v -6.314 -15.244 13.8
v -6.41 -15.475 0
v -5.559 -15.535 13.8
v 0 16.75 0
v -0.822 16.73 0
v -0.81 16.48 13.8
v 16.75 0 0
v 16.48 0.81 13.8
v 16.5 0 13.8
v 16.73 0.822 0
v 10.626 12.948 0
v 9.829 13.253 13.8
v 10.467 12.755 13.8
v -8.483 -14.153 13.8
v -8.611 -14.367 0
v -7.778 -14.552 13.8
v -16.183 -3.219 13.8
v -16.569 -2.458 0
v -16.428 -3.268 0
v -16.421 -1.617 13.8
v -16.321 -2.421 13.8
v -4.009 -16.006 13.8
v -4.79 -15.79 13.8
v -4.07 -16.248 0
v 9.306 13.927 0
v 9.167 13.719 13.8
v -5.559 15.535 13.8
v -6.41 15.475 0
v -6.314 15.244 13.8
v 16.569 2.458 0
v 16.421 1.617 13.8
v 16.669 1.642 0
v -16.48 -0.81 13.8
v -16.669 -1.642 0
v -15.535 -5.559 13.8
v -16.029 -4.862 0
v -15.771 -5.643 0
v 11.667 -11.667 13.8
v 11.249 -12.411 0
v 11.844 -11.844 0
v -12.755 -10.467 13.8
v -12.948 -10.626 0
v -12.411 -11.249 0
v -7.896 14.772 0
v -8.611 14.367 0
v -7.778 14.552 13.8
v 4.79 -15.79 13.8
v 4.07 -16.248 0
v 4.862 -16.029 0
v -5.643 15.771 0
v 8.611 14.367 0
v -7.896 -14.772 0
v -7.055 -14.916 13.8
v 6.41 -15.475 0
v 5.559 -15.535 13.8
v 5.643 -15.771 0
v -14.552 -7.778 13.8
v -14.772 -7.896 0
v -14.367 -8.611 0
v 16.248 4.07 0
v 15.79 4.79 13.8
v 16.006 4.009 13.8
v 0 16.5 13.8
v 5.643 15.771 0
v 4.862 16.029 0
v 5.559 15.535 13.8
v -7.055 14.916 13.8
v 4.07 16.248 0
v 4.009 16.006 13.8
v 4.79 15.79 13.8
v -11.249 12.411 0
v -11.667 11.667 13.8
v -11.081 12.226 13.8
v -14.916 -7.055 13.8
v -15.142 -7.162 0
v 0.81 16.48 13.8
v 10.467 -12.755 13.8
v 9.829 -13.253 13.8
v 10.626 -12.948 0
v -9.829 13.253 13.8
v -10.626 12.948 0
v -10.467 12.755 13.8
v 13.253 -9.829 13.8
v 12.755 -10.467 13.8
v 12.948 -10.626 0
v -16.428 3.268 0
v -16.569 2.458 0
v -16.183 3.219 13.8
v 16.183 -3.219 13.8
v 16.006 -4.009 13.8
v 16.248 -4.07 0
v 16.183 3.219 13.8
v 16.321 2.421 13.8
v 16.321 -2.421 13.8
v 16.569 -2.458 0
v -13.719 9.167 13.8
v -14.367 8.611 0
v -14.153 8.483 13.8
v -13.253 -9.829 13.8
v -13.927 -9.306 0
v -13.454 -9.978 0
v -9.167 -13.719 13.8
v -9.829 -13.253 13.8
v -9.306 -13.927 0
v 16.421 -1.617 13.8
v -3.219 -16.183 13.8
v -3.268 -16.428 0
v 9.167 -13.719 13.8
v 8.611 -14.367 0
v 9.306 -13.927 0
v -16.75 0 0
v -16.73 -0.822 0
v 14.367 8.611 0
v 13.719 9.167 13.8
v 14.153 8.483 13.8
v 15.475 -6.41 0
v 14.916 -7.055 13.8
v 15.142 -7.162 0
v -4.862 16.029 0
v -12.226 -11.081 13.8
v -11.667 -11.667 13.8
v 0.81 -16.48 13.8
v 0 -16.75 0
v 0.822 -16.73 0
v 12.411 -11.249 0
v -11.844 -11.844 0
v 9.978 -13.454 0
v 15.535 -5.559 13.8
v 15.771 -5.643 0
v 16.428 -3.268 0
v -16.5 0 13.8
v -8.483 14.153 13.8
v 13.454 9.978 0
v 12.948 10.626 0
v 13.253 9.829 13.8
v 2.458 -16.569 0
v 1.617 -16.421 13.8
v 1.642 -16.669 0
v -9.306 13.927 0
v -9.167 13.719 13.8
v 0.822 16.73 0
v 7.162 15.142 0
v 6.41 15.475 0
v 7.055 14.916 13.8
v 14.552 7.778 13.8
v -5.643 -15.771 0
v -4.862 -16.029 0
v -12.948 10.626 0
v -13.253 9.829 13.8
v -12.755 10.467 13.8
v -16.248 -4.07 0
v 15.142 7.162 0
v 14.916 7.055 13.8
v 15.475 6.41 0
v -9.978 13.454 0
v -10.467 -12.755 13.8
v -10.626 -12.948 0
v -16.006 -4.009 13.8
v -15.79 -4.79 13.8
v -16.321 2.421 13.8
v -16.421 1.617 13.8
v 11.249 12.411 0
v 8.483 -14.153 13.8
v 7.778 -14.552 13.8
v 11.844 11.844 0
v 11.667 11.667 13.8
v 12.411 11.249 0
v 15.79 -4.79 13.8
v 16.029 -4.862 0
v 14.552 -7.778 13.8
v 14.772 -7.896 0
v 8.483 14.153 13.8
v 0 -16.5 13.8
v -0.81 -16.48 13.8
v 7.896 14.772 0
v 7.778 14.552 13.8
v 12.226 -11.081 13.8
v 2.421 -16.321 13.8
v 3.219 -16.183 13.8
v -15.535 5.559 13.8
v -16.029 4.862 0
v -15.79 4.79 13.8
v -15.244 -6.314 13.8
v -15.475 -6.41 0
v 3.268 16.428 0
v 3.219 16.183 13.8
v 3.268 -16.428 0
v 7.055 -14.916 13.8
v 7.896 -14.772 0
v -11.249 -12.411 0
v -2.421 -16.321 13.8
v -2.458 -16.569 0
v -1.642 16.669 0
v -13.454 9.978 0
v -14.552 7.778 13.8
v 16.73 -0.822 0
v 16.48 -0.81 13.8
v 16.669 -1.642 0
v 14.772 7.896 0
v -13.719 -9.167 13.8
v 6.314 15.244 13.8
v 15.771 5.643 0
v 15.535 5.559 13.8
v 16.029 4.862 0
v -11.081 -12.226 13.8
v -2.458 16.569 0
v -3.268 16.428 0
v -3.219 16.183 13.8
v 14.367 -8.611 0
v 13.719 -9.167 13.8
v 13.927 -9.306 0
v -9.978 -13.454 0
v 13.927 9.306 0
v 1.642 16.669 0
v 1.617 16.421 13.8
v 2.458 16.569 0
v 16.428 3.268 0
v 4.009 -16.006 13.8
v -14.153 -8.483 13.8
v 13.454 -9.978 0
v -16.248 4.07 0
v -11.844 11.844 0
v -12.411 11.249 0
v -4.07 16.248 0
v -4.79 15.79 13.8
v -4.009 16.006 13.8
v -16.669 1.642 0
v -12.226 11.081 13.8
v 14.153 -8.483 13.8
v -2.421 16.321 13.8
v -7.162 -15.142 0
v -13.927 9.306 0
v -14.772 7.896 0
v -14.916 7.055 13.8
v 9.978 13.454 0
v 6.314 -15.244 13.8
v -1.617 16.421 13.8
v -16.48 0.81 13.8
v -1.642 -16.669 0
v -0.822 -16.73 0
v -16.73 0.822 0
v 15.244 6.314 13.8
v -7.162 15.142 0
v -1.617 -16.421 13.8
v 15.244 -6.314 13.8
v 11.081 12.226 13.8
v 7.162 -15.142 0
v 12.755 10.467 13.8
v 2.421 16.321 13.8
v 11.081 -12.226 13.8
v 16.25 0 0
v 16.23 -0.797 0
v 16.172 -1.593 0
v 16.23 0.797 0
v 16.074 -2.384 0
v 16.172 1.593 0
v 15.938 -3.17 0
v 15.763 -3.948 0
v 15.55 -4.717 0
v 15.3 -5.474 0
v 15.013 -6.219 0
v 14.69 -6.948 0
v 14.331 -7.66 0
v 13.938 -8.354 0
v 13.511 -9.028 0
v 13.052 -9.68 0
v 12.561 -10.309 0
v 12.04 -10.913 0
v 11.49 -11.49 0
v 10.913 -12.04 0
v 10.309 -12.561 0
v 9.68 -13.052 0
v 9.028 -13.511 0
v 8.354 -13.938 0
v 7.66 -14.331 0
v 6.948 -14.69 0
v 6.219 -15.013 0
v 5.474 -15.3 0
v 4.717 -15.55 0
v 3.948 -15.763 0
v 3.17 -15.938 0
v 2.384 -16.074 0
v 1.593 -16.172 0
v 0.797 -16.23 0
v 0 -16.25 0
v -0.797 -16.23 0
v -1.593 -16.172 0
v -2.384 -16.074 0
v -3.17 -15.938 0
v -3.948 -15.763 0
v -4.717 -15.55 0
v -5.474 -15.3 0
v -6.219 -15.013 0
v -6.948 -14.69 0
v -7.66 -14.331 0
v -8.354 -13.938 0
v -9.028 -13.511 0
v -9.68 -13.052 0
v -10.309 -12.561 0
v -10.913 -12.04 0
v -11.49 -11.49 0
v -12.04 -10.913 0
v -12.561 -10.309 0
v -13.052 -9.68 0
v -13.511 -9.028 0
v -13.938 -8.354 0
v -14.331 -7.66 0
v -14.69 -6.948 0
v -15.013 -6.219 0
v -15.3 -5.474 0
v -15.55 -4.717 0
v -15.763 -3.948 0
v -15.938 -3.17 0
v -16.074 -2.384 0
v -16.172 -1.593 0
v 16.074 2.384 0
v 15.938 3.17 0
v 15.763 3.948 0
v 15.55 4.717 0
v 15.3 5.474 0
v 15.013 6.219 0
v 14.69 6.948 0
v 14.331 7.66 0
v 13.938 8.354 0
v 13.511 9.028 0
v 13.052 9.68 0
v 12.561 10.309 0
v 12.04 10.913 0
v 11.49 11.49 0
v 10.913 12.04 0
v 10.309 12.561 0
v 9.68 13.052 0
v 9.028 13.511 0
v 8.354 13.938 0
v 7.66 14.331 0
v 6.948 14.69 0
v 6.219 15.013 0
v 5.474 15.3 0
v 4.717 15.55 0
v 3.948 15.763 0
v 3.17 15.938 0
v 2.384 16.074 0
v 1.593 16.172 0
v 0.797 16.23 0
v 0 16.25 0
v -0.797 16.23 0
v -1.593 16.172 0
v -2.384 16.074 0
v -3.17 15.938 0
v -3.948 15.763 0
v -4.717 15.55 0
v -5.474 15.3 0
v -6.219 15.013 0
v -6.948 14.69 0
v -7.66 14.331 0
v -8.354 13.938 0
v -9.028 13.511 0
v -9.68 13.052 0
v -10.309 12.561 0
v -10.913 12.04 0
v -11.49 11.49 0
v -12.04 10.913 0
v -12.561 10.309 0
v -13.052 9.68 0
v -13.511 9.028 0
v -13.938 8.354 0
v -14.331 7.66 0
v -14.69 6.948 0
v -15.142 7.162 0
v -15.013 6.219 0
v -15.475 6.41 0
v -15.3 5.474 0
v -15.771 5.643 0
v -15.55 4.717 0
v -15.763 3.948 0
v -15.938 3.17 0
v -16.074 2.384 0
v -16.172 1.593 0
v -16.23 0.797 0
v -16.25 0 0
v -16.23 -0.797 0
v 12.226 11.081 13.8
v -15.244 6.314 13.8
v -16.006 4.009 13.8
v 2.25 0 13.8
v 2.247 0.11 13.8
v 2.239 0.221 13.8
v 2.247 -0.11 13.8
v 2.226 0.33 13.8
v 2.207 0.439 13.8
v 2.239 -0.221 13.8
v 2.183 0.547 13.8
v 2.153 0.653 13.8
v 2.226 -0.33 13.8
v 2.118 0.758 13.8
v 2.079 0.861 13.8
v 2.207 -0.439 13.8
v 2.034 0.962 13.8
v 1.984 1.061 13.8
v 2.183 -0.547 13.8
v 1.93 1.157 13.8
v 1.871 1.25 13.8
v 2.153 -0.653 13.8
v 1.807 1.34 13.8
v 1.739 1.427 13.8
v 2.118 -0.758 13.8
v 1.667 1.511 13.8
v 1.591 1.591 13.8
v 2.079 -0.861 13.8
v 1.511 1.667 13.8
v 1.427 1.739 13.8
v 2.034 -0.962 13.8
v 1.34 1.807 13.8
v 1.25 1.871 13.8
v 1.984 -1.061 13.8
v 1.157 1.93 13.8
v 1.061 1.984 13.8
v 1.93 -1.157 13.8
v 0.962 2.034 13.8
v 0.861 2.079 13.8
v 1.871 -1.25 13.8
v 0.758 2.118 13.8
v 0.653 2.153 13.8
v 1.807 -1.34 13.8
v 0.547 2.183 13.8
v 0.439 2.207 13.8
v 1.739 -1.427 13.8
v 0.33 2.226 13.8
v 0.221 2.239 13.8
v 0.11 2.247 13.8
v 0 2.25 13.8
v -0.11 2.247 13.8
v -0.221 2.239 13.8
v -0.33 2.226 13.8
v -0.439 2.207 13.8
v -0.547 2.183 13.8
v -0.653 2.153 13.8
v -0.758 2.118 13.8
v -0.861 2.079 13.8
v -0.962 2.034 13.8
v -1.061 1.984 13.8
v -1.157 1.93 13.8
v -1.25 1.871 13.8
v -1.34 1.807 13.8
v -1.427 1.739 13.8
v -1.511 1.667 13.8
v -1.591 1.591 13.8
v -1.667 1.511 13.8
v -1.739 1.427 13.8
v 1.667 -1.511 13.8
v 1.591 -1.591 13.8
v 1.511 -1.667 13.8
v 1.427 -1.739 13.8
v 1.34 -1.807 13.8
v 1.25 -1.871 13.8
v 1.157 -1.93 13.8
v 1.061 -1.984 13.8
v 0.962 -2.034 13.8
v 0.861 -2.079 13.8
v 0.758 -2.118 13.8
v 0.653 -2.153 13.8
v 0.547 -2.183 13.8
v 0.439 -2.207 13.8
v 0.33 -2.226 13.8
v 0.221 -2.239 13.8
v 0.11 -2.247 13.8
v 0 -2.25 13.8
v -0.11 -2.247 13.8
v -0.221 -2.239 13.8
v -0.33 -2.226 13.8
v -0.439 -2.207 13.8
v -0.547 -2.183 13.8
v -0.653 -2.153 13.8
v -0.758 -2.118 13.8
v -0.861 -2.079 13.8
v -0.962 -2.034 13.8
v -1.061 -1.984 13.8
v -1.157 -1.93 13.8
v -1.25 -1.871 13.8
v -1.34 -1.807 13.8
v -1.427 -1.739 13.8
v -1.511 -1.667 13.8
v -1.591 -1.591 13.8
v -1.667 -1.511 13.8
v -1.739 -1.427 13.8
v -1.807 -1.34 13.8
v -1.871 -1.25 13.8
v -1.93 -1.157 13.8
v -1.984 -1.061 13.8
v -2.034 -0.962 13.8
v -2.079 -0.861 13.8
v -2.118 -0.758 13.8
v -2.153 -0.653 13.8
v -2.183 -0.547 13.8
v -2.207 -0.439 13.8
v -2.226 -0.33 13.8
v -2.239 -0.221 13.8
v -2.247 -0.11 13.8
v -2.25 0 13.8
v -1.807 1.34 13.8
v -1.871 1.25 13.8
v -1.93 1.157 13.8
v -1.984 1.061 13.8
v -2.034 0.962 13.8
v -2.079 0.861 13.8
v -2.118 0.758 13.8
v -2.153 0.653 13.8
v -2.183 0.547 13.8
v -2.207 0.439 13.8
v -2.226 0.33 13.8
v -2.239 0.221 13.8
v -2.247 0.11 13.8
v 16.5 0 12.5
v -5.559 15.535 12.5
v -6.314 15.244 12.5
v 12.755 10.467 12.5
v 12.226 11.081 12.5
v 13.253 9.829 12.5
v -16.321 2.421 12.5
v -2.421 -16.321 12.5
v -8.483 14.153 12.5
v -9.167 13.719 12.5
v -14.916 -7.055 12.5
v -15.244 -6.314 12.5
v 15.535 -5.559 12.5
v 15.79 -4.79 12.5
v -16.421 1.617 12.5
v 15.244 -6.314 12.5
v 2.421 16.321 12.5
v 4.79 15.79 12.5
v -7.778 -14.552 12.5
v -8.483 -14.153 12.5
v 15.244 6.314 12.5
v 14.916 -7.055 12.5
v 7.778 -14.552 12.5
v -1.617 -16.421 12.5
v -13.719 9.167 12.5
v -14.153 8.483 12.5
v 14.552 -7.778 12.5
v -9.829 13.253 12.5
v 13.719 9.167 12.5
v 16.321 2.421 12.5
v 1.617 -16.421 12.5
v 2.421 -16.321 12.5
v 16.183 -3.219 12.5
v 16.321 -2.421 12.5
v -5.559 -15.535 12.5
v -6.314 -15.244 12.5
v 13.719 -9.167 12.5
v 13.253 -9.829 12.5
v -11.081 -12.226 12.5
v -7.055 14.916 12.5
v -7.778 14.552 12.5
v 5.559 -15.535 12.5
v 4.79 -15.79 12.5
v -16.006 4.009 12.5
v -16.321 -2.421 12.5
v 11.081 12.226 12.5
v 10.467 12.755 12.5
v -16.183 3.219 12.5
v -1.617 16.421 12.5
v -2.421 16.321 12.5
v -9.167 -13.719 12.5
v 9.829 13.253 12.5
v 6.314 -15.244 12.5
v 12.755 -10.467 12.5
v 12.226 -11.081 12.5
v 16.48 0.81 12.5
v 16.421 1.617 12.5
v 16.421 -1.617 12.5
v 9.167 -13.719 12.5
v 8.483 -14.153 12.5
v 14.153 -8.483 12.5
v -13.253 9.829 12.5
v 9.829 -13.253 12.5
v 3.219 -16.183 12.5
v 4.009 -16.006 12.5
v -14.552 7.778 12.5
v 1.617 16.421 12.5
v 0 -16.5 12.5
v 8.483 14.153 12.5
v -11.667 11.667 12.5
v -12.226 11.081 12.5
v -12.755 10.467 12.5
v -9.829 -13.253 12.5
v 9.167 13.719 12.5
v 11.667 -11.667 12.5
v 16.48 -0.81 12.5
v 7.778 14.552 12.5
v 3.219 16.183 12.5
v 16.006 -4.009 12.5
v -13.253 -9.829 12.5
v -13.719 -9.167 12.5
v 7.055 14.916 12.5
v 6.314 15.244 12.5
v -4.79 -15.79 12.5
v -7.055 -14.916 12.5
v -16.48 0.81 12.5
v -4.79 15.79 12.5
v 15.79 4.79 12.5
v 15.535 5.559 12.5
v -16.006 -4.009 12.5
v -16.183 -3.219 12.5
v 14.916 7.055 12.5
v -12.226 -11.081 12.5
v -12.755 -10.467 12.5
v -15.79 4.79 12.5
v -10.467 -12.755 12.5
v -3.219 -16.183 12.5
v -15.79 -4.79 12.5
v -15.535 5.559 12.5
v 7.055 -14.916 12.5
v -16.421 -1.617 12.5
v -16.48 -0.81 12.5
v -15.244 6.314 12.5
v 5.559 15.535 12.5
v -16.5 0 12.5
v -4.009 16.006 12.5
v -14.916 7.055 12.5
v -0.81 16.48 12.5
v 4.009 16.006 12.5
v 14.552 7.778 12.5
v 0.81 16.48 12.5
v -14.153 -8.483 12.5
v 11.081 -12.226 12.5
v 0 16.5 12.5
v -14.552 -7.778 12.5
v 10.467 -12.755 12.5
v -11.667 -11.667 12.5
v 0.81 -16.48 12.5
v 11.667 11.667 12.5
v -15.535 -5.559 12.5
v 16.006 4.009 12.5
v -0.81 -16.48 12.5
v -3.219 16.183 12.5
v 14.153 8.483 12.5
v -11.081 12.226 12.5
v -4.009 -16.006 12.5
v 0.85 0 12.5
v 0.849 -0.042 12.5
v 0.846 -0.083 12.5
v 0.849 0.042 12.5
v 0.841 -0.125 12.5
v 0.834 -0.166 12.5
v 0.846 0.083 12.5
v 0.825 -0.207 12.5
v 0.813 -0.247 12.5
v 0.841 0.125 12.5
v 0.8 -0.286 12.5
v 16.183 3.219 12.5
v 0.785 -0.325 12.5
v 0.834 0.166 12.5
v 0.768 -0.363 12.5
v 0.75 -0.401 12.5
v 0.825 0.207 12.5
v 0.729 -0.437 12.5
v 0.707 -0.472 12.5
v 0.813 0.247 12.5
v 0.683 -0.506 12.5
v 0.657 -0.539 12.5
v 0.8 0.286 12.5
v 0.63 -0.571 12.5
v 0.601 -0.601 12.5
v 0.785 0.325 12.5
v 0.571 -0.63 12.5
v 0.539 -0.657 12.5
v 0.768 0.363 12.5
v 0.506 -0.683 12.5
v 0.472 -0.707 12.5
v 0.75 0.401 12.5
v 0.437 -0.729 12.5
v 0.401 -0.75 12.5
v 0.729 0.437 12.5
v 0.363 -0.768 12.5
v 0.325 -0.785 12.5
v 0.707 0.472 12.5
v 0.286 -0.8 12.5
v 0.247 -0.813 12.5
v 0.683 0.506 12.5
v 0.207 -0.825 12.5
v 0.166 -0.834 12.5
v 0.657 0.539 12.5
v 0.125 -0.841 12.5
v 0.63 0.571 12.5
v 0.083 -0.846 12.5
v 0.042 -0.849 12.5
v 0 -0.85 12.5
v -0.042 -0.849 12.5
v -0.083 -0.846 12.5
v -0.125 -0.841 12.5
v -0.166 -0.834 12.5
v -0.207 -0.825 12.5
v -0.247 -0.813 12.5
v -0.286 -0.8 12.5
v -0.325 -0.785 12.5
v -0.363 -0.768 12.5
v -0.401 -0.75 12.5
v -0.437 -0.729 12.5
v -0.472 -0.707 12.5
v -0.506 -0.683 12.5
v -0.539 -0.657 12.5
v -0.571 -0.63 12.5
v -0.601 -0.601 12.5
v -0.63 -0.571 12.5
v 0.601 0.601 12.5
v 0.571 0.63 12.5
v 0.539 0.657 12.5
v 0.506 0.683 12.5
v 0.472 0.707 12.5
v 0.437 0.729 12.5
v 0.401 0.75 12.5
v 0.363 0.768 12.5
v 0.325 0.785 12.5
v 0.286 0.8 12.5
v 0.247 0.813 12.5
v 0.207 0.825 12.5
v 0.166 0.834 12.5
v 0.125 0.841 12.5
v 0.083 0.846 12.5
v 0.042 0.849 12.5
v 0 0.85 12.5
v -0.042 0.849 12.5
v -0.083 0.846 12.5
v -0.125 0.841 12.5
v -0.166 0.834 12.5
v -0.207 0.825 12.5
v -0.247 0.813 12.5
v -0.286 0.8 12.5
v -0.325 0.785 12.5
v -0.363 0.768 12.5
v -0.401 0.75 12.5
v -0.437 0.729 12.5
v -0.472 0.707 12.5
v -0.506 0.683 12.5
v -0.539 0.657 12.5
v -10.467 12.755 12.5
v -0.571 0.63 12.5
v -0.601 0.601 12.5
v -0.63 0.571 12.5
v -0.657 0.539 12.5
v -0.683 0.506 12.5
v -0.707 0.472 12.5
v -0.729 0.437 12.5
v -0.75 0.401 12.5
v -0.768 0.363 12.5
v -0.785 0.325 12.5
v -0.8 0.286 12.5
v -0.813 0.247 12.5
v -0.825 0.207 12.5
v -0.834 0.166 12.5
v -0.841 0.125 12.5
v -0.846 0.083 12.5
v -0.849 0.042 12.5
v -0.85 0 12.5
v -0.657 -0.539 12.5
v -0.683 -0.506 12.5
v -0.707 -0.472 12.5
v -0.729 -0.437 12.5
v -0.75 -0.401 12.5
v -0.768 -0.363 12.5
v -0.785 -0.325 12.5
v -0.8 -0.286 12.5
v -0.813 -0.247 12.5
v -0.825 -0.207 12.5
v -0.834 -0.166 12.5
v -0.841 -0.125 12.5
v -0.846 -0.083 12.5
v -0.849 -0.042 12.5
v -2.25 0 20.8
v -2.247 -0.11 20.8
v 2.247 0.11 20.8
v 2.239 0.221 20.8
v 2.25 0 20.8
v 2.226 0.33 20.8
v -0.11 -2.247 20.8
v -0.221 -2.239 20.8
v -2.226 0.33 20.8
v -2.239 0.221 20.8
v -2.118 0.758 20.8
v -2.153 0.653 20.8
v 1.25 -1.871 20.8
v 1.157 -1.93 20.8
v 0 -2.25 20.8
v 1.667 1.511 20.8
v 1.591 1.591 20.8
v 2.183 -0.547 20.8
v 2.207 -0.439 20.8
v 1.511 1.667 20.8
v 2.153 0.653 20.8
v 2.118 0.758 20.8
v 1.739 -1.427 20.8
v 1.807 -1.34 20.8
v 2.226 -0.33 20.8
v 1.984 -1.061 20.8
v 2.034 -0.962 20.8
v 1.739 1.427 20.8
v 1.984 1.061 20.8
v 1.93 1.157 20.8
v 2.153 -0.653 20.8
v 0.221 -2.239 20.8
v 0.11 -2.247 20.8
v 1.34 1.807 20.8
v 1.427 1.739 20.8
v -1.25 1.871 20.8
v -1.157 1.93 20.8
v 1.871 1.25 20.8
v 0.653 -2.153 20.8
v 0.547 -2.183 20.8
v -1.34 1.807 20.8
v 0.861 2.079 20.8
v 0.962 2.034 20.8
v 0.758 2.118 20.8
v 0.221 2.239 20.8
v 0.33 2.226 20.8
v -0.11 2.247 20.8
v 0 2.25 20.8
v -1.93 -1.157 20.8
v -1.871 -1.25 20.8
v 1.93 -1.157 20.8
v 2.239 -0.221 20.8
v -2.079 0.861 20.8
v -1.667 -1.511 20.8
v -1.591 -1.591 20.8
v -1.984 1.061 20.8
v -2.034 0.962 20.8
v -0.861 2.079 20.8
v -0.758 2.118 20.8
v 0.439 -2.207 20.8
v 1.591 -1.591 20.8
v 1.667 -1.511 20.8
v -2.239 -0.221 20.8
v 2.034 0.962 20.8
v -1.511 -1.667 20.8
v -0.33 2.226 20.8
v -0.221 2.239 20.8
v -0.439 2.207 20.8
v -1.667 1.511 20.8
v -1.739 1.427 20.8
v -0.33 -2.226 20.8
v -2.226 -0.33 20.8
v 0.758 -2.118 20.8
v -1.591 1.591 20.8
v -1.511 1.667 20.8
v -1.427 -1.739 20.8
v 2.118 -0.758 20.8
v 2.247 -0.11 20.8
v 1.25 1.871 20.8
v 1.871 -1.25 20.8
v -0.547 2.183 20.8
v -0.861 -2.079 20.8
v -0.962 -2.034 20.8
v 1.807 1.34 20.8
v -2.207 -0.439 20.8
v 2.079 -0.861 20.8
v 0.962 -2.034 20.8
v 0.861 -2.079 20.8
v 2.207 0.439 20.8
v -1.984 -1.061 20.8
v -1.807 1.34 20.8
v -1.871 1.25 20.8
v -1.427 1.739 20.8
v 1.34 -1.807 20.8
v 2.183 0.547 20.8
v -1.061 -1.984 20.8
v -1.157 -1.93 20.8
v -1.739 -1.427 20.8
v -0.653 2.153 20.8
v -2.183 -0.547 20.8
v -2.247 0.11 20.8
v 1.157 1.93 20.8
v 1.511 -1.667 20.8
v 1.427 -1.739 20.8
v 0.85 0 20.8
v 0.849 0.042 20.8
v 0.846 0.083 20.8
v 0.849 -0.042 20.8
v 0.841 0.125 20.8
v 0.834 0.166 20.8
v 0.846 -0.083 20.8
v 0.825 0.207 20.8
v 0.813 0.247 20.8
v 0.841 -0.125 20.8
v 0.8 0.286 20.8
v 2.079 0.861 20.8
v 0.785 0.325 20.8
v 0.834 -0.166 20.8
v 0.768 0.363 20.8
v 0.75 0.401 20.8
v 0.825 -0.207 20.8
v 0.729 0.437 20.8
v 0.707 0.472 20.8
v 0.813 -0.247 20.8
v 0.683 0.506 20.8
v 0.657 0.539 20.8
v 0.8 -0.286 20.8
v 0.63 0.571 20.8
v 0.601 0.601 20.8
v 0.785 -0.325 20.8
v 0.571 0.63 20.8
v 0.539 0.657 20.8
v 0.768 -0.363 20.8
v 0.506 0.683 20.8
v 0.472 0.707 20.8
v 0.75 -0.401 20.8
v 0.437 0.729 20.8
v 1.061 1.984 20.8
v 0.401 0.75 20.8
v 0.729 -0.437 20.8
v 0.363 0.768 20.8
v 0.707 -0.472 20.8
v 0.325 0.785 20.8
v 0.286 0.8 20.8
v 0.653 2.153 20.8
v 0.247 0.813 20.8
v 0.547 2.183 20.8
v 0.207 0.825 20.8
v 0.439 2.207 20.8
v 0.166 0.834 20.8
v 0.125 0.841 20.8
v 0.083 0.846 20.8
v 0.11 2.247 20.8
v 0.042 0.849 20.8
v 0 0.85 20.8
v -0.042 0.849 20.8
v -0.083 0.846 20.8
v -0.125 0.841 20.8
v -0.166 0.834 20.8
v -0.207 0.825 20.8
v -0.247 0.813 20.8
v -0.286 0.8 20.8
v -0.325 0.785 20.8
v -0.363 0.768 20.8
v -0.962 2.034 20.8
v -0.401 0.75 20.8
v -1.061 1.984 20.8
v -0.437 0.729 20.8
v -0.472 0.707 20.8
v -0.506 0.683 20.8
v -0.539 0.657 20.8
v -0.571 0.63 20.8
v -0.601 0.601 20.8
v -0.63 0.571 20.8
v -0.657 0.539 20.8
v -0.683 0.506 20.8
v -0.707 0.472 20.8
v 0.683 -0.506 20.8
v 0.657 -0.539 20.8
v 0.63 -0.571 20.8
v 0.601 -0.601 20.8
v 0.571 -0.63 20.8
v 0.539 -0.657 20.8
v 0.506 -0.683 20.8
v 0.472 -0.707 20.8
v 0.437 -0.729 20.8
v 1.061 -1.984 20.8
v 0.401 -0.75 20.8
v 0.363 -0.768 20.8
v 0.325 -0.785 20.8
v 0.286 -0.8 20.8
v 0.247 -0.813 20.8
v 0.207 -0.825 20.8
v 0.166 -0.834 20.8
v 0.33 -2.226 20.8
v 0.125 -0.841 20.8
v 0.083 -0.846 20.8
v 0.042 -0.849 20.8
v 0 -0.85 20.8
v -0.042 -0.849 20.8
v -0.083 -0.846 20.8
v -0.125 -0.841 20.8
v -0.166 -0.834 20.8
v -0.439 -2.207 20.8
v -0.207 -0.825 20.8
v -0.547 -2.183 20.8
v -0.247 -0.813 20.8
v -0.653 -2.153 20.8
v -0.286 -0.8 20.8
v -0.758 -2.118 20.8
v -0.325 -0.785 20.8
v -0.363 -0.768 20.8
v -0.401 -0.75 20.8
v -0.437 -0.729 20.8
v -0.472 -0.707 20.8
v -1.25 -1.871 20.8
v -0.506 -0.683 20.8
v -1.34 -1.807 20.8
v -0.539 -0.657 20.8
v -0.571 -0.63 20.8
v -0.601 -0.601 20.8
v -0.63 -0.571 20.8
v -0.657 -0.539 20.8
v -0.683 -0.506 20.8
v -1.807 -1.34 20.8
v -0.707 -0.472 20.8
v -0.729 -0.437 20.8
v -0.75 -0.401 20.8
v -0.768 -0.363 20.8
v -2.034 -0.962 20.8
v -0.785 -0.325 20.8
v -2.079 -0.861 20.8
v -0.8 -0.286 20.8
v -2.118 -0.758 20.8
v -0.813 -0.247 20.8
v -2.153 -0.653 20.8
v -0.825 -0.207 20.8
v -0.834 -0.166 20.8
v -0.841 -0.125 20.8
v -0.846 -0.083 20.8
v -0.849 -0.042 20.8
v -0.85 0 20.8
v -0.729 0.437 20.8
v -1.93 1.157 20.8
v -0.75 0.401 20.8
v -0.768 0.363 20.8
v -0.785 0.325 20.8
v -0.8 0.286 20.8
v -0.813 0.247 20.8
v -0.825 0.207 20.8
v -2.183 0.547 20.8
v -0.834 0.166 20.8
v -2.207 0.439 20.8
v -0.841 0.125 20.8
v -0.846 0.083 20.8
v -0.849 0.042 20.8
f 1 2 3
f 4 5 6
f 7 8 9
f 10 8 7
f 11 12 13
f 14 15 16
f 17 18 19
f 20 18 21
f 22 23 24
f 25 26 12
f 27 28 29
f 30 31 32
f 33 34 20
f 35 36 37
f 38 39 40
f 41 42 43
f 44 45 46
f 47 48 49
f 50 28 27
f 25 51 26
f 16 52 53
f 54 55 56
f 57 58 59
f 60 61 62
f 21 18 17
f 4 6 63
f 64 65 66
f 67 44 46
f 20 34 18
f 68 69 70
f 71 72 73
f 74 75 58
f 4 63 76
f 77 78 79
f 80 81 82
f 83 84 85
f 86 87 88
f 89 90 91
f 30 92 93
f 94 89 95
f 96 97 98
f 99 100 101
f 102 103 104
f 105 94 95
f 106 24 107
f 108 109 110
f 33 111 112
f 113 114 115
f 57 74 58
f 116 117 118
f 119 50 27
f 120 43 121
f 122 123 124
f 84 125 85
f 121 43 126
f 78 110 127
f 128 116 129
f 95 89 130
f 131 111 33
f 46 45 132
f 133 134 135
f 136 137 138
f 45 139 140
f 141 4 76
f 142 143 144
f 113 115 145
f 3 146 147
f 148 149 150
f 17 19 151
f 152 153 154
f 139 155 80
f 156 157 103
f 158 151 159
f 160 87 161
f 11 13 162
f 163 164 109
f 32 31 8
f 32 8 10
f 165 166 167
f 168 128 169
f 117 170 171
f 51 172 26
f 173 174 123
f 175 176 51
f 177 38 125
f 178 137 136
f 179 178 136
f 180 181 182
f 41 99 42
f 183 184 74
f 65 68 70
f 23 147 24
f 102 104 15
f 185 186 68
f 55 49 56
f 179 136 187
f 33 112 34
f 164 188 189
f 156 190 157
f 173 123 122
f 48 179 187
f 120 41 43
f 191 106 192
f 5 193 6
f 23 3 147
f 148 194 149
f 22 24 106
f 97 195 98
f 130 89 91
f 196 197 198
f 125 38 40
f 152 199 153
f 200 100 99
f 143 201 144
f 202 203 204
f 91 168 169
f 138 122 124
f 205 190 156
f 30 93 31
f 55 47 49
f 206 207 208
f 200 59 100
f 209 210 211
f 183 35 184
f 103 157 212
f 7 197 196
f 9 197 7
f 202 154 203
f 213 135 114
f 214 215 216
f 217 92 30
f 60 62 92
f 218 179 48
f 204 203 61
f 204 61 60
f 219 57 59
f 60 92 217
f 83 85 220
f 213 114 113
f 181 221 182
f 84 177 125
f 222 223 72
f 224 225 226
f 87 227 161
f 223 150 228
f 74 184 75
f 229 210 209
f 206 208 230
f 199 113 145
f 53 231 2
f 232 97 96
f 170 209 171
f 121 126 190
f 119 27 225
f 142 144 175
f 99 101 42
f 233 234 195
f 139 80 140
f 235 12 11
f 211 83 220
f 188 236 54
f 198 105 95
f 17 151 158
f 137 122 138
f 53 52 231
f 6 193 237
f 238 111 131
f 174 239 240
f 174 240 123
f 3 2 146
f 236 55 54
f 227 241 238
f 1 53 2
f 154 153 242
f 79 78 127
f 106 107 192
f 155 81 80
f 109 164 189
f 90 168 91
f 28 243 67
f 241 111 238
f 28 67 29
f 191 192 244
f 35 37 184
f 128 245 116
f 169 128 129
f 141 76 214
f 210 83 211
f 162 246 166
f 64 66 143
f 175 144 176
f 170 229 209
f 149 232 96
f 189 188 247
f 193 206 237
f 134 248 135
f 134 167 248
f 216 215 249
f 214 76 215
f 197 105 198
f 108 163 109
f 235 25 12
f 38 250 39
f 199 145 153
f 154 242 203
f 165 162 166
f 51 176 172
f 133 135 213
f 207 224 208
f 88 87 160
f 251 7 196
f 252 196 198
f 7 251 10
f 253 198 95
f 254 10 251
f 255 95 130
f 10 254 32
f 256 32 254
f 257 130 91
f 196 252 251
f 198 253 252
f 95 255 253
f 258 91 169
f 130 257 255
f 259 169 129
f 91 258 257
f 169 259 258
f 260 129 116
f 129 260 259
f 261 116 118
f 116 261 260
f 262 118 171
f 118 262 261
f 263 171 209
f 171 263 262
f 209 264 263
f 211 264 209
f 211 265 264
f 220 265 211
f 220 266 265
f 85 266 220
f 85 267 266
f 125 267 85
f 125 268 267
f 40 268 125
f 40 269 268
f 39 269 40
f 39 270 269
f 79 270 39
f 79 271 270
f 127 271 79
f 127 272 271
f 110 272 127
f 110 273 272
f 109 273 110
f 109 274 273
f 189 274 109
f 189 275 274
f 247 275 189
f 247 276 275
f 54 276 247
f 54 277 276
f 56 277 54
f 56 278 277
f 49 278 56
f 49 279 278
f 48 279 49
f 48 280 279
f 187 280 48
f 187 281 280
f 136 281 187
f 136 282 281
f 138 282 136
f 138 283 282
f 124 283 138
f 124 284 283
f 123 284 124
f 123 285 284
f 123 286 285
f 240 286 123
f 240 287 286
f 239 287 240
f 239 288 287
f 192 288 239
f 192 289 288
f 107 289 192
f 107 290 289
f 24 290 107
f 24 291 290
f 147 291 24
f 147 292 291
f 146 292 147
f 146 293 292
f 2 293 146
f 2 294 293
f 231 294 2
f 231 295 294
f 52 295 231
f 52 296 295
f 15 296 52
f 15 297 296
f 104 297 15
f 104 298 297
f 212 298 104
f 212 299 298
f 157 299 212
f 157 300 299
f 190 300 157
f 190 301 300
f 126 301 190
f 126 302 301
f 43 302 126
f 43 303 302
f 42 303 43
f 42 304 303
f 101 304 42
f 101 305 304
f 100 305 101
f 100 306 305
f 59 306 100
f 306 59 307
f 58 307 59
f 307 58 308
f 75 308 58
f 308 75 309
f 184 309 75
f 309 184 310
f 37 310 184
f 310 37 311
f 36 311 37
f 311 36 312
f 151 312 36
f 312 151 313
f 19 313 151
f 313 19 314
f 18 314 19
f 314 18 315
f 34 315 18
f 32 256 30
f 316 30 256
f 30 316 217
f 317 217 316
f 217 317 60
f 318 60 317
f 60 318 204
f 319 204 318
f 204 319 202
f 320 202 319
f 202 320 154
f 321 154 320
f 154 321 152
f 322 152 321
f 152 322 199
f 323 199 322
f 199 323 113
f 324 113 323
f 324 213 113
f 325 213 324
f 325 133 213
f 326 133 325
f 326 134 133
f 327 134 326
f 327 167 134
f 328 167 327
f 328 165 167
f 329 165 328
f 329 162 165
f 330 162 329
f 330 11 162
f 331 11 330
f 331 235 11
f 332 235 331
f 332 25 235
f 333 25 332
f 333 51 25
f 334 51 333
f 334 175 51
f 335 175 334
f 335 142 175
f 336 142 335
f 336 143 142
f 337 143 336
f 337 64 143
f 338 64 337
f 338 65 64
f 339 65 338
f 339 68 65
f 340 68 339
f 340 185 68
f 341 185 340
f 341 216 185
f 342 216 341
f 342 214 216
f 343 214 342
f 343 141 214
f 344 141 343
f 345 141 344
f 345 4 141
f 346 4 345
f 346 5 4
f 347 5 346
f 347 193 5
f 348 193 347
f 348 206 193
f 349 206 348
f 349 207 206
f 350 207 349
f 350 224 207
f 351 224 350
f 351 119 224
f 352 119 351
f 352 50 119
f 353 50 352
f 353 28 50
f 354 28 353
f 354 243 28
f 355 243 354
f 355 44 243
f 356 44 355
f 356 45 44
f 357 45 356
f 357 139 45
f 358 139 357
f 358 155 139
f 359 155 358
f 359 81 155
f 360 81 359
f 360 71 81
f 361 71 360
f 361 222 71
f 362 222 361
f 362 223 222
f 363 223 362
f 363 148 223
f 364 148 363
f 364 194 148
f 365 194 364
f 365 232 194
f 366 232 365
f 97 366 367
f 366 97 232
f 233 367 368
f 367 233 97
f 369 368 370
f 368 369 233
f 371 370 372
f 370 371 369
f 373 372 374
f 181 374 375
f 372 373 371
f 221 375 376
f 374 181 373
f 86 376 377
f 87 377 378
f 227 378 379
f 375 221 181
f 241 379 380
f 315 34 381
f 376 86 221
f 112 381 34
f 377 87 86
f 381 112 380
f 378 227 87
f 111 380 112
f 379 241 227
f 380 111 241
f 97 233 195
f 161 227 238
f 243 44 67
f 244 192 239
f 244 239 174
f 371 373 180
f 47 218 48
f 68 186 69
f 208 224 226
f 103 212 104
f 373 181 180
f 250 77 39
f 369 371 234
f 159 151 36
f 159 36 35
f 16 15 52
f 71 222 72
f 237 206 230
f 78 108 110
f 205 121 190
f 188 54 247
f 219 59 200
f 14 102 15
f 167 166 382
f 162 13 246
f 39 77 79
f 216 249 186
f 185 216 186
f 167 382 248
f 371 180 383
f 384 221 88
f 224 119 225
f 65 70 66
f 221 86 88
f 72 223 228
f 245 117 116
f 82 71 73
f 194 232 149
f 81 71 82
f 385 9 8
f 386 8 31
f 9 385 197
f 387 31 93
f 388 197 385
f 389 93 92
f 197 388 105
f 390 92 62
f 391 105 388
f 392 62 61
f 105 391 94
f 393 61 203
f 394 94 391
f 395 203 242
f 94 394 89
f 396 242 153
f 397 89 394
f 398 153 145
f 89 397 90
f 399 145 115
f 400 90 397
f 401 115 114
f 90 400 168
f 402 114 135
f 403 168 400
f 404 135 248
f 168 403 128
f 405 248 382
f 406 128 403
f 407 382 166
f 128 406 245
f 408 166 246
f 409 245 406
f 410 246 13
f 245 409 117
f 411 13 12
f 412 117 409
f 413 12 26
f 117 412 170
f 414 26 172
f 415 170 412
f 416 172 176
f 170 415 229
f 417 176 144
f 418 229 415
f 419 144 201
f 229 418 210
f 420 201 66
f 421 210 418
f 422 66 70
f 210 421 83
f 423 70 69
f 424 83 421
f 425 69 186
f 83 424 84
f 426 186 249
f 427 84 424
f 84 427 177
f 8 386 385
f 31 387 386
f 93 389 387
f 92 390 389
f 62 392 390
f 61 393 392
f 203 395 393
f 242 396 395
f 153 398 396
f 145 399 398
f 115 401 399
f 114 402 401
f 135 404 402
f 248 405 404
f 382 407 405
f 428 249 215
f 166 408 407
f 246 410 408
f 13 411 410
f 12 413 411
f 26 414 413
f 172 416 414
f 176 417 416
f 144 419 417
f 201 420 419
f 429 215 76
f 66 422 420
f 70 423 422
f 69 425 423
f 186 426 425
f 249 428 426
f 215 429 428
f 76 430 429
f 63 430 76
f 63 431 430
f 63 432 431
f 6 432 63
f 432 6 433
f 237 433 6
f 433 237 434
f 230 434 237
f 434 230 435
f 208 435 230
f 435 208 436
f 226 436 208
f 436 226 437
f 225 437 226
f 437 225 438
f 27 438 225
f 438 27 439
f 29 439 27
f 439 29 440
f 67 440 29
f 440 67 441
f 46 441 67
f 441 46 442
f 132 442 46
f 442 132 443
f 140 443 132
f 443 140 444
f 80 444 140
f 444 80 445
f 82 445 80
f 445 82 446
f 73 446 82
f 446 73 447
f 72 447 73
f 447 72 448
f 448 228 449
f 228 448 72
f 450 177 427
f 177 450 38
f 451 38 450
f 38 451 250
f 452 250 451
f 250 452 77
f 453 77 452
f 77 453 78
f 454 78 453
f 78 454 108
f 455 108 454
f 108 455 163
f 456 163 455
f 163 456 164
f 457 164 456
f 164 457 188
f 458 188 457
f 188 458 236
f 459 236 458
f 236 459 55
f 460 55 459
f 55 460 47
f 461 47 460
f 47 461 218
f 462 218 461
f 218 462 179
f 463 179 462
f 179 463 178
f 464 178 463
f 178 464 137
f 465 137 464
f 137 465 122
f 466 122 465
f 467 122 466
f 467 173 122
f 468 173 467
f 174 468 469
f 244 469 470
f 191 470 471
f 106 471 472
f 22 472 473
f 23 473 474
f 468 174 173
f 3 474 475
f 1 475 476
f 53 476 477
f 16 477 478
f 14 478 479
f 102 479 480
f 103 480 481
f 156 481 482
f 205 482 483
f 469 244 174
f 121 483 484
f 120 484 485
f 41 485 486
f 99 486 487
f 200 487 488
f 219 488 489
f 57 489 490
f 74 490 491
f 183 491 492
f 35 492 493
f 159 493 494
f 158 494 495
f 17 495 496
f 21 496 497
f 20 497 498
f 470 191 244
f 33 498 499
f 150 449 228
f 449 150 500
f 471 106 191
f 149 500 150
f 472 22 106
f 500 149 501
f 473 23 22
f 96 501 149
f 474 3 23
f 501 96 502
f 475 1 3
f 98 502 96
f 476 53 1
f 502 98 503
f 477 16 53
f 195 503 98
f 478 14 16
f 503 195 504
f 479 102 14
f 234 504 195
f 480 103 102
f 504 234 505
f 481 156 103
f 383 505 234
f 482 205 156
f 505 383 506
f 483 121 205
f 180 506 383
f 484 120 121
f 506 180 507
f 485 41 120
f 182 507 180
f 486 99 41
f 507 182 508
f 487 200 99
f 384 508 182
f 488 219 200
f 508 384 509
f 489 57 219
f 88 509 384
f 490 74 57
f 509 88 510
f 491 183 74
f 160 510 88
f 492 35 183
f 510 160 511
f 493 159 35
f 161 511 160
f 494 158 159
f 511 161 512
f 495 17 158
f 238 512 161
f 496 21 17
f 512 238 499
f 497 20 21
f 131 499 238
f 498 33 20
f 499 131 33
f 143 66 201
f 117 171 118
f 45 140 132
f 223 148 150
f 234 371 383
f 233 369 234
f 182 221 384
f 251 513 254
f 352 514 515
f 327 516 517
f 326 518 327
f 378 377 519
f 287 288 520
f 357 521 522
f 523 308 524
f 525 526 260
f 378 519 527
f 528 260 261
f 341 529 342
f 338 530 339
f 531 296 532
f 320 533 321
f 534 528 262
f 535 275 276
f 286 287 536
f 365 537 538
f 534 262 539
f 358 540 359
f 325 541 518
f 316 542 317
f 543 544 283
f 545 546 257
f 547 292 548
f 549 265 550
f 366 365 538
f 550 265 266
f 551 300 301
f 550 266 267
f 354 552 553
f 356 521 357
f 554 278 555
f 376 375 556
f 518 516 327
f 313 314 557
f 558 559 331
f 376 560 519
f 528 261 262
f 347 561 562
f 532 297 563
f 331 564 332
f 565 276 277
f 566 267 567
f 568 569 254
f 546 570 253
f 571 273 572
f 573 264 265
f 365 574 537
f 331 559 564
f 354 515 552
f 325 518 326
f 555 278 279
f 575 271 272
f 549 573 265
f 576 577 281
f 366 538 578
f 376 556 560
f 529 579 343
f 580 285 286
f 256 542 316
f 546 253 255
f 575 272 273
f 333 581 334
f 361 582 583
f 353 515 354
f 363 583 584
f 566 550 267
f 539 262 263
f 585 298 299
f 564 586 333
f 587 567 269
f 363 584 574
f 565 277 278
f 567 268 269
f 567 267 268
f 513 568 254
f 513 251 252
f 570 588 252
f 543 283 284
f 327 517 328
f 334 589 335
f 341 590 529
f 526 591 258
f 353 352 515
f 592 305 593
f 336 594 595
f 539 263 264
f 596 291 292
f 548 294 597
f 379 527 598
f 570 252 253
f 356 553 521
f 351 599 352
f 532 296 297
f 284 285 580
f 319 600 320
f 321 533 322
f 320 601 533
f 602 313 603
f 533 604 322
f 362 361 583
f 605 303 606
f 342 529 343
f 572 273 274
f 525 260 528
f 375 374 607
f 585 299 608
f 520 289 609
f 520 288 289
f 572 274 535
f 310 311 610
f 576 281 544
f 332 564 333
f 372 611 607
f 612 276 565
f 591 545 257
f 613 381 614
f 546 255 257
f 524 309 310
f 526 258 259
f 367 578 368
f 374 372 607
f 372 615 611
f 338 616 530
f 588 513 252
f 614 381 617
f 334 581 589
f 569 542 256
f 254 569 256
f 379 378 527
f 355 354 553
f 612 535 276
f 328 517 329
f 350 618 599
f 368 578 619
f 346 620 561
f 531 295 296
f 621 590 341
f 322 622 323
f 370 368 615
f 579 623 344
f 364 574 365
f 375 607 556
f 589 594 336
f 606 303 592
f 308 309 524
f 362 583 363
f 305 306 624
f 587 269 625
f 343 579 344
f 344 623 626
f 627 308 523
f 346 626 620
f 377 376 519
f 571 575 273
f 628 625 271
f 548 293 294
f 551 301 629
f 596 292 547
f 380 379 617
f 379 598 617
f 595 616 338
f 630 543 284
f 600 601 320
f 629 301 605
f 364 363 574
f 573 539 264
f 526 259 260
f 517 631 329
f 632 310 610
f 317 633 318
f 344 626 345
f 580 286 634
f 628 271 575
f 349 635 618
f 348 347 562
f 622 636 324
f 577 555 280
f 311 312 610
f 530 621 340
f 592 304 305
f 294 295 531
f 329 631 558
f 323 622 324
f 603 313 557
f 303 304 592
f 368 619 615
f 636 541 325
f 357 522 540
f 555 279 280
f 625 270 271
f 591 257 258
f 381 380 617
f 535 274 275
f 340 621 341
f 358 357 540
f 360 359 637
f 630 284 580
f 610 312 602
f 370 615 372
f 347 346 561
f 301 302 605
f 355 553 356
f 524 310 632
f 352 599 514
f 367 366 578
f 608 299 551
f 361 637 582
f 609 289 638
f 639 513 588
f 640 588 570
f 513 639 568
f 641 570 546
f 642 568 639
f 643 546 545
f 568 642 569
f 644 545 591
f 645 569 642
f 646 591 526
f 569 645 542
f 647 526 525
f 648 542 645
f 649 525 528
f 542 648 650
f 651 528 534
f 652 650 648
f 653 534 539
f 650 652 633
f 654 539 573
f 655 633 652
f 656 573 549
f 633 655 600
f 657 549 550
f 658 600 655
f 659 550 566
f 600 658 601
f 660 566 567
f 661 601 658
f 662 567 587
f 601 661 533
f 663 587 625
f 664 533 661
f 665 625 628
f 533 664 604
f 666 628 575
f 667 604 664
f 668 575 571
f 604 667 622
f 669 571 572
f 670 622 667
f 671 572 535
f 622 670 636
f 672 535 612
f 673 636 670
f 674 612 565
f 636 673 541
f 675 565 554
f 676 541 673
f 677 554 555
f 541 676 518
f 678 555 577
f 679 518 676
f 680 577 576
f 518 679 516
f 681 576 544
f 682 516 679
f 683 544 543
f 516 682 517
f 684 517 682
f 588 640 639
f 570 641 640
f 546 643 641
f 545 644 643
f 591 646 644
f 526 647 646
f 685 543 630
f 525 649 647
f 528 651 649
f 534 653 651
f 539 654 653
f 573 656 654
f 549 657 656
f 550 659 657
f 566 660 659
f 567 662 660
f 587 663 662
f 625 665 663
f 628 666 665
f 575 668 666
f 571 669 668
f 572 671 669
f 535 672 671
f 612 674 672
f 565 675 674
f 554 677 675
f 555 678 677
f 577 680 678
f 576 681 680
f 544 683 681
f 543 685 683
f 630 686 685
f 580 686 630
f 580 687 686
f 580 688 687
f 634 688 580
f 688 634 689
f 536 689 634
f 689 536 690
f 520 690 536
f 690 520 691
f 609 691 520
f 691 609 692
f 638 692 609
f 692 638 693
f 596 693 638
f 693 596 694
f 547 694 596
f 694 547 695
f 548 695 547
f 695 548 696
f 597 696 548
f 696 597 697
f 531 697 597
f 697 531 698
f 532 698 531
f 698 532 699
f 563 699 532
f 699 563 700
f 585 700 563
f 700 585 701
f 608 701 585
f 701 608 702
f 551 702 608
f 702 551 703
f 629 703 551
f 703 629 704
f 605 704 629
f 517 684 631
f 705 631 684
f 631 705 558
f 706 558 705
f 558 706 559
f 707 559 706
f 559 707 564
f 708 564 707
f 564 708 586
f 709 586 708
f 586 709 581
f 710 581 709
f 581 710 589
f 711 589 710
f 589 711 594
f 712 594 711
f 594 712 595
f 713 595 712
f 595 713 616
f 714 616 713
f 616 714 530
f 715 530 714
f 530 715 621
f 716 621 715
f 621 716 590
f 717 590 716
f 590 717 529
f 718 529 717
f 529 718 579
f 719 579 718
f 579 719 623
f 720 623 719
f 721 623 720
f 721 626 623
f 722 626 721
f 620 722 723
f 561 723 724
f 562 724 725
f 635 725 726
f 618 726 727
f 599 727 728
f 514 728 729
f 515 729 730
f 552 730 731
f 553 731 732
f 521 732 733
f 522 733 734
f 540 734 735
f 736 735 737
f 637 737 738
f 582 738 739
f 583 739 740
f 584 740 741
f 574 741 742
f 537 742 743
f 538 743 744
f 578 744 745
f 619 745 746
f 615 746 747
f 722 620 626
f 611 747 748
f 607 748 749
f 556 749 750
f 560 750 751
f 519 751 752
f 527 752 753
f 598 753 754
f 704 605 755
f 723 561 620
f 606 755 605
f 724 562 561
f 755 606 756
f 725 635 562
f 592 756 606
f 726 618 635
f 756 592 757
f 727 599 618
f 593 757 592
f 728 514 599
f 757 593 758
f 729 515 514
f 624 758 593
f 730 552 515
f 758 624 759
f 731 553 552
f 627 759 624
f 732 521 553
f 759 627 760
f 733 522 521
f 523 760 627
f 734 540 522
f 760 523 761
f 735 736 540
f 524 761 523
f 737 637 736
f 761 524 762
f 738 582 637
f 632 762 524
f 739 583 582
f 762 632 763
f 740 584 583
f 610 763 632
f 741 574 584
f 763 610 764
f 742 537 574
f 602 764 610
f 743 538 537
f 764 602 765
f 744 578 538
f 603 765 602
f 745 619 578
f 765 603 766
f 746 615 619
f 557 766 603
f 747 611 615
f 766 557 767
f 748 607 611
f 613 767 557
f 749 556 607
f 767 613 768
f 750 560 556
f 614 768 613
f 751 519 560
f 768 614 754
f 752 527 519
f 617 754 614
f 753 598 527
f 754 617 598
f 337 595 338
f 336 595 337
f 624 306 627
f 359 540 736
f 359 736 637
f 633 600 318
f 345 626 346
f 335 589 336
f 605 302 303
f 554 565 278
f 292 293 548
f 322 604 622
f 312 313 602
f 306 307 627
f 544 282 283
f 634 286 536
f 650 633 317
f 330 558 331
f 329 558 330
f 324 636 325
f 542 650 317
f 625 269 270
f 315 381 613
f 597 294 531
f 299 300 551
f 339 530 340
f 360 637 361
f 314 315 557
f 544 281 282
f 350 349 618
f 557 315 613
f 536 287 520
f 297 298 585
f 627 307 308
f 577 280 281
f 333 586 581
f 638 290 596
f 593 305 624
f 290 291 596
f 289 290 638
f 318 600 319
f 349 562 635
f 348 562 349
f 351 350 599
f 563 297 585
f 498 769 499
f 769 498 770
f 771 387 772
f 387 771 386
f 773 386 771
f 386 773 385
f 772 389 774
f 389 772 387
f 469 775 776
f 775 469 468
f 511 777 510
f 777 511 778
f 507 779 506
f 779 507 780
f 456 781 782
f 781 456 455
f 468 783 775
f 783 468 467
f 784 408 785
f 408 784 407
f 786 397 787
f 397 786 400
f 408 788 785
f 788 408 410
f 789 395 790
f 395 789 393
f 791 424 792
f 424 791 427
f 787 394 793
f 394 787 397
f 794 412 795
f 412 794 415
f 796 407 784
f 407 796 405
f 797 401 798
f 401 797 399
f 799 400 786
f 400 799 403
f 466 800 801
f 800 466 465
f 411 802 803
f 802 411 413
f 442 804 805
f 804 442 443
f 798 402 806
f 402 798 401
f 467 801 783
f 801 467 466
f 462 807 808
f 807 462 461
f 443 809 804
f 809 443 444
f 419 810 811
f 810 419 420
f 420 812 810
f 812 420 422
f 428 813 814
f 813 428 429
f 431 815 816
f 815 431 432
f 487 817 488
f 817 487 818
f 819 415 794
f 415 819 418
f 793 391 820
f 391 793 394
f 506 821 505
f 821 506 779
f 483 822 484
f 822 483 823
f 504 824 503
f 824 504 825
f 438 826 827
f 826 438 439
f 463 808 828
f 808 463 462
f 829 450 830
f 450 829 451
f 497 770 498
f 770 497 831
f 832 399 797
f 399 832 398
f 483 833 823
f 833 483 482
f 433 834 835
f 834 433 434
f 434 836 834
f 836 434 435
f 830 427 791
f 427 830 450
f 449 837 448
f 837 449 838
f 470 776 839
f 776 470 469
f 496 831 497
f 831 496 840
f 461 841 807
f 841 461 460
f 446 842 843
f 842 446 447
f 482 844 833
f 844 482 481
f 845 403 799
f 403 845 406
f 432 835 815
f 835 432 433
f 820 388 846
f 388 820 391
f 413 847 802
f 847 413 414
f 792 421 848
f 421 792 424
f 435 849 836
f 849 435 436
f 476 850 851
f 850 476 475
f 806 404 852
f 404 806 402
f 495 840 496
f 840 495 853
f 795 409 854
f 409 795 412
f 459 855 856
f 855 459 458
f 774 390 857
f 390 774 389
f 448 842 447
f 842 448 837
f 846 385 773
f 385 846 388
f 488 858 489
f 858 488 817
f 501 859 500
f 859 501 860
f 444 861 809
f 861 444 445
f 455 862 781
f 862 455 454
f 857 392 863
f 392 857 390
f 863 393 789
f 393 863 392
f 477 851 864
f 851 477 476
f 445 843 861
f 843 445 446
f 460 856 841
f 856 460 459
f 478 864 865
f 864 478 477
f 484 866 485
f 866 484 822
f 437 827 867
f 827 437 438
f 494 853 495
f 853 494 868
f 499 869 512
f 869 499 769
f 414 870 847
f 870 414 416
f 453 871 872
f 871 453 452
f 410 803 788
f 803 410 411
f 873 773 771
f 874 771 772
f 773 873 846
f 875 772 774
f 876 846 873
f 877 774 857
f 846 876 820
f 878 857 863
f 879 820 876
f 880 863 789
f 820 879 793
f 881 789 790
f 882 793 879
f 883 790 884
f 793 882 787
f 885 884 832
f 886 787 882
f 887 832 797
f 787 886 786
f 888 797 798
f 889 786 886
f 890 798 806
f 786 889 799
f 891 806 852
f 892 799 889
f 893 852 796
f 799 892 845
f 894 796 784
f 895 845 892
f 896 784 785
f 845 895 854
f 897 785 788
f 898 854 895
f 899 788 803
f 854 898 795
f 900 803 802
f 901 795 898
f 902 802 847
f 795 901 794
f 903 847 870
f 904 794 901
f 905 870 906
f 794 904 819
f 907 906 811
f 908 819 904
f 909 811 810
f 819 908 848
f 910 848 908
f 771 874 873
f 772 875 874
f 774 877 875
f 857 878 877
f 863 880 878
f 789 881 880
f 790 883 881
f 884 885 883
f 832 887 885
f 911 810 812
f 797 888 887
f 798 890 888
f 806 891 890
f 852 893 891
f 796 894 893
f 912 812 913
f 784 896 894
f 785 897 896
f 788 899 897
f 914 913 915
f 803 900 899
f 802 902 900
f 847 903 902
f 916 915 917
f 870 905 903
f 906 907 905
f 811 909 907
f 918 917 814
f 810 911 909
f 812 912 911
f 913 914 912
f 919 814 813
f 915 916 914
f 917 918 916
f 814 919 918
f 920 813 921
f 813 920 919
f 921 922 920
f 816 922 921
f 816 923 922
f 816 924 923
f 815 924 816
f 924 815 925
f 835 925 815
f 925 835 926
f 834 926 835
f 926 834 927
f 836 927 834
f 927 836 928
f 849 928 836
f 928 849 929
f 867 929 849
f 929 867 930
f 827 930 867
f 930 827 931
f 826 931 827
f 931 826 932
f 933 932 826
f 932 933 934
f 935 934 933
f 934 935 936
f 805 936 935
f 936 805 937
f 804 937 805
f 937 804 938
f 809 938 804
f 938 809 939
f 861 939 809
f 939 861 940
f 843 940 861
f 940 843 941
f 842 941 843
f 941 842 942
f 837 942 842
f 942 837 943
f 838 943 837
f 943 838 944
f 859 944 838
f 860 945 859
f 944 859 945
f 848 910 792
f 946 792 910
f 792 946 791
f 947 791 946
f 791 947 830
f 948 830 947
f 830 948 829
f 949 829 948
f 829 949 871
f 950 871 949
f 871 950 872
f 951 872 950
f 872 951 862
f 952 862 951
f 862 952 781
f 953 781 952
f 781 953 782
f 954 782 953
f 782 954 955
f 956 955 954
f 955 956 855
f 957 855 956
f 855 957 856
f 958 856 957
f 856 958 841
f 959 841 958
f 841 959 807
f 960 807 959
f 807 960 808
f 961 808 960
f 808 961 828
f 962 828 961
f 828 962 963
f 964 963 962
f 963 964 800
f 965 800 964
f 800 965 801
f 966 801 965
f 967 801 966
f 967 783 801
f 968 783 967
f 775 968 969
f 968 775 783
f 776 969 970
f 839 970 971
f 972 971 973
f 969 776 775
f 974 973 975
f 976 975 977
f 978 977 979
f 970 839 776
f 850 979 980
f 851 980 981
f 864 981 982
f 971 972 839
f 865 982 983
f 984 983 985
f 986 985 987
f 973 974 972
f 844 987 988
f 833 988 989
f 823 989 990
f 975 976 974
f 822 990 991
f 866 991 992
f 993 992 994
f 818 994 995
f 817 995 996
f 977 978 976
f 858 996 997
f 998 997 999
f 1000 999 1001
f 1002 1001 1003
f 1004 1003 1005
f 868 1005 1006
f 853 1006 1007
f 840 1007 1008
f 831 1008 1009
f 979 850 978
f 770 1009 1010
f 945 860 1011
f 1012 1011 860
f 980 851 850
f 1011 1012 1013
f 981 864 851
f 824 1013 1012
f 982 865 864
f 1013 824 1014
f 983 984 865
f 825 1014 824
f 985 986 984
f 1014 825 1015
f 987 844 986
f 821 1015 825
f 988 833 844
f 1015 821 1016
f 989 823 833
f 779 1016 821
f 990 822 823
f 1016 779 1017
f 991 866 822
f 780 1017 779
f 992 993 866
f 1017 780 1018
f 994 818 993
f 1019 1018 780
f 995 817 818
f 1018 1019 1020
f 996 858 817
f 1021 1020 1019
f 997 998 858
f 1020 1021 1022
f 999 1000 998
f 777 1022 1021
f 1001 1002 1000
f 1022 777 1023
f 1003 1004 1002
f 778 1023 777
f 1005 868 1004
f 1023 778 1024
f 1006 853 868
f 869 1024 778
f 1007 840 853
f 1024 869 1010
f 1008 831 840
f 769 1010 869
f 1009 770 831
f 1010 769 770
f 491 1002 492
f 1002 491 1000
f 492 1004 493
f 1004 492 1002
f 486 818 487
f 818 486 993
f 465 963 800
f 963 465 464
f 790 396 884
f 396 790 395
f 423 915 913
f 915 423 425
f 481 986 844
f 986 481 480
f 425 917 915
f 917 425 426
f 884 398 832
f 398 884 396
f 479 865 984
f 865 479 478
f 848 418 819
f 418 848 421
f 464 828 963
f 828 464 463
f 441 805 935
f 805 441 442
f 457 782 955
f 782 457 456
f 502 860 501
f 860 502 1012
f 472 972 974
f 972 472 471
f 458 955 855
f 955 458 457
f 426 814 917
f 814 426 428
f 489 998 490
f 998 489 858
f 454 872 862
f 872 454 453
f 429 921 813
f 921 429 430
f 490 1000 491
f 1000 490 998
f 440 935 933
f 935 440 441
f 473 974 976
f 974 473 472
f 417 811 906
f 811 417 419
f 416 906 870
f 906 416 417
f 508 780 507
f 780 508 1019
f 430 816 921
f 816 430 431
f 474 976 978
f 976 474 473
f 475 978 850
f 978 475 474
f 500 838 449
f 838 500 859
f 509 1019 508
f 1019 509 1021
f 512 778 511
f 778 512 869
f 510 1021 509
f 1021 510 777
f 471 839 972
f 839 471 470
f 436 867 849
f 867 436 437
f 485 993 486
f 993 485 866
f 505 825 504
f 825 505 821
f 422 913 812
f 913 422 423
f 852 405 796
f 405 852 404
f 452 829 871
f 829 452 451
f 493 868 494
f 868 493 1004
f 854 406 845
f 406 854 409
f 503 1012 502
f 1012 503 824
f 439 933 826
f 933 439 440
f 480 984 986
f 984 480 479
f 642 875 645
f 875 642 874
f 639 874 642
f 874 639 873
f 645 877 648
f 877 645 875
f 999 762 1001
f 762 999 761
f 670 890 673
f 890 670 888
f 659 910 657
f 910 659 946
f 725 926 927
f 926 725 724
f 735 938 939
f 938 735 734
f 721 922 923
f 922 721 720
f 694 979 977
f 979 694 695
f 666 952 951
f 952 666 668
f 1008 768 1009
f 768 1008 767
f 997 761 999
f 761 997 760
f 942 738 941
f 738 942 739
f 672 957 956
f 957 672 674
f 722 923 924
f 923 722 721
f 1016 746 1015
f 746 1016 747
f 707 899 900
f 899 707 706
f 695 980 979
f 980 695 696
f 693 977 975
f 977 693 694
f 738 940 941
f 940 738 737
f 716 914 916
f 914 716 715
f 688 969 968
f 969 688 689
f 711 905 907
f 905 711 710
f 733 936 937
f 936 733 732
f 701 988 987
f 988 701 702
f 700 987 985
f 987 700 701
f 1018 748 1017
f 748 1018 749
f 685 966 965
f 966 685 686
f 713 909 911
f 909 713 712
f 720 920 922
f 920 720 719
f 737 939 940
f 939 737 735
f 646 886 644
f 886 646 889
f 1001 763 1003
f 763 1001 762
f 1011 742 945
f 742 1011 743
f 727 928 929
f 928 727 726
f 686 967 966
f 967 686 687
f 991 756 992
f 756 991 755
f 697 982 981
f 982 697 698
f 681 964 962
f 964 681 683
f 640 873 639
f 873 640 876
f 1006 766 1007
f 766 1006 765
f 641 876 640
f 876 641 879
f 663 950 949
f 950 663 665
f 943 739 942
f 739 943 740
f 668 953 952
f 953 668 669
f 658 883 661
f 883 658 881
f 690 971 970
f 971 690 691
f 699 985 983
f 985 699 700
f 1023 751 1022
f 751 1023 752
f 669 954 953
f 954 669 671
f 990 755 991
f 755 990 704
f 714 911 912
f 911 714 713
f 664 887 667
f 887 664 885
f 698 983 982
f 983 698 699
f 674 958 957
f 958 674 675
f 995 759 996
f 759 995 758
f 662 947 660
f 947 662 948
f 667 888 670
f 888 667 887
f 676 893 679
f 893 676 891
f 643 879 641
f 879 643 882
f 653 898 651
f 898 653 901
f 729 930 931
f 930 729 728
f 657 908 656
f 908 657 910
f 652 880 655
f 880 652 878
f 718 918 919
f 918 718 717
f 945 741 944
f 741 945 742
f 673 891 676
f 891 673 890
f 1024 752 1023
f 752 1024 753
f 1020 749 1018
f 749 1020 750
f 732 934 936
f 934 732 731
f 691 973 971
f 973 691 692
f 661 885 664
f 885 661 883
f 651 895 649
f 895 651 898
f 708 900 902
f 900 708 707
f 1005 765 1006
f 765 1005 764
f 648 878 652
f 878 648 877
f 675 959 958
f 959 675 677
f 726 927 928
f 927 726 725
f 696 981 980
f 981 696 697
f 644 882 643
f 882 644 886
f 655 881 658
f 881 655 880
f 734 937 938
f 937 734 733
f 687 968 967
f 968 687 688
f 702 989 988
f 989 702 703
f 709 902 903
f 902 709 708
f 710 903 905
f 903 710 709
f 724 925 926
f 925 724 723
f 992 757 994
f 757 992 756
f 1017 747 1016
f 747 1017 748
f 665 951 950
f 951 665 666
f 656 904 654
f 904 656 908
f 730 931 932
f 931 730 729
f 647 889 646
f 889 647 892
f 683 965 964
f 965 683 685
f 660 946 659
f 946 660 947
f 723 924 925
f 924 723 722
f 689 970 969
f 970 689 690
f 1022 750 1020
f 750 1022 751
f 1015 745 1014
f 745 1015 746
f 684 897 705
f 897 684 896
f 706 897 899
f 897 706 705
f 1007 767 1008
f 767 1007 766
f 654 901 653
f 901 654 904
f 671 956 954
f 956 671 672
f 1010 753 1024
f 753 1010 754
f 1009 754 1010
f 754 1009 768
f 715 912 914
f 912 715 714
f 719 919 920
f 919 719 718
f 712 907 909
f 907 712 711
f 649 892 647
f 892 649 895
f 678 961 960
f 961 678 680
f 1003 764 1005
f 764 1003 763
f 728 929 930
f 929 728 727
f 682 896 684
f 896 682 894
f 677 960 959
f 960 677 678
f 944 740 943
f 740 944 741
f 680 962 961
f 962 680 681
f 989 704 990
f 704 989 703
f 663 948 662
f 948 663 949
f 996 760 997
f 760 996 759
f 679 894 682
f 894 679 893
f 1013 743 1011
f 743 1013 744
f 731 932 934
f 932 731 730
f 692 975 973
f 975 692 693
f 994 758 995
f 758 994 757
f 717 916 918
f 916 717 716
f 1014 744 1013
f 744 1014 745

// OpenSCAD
//Stryfe Flywheel Model
//(c) Diaries of a Nerf Armourer - available under license CC-BY 4.0 International. See repo for full details.
//nerfarmourer.tumblr.com

//Flywheel parameters - all in mm
FLYWHEEL_BOTTOM_DIA = 33.5;
FLYWHEEL_UPPER_DIA = 33;
FLYWHEEL_HEIGHT = 13.8;

FLYWHEEL_WALL_THICKNESS = 1;
FLYWHEEL_INTERNAL_DEPTH = 12.5; //Depth from the bottom of the flywheel to the 'roof' on the inside

//Push fit parameters for factory cloned flywheels
PUSH_FIT_SHAFT_DIA = 4.5;
PUSH_FIT_SHAFT_HEIGHT = 7;
PUSH_FIT_SHAFT_WIDTH = 1.7;

//Motor Dimensions
MOTOR_SHAFT_DIA = 2;

$fn = 128; //Set to hi-res render, comment out for testing/speed

module StryfeFlywheel()
{
    //Code to produce basic flywheel without cutouts or shaft mounts
    
    difference()
    {     
        cylinder(d1 = FLYWHEEL_BOTTOM_DIA, d2 = FLYWHEEL_UPPER_DIA, h = FLYWHEEL_HEIGHT);
        
        cylinder(d1 = FLYWHEEL_BOTTOM_DIA - FLYWHEEL_WALL_THICKNESS , d2 = FLYWHEEL_UPPER_DIA, h = FLYWHEEL_INTERNAL_DEPTH);
    }
}

module PushFitFlywheel()
{
    //Code to replicate basic Stryfe flywheels as per factory output
    difference()
    {  
        union()
        {
            //Combine flywheel geometry with shaft positive geometry
             StryfeFlywheel();
            
            translate([0, 0, FLYWHEEL_HEIGHT])
            {
                cylinder(d = PUSH_FIT_SHAFT_DIA, h = PUSH_FIT_SHAFT_HEIGHT);
            }
        }
        
        //Subract the flywheel shaft to produce motor shaft mounting
        cylinder(d = PUSH_FIT_SHAFT_WIDTH, h = PUSH_FIT_SHAFT_HEIGHT + FLYWHEEL_HEIGHT);
    }
}

PushFitFlywheel();
